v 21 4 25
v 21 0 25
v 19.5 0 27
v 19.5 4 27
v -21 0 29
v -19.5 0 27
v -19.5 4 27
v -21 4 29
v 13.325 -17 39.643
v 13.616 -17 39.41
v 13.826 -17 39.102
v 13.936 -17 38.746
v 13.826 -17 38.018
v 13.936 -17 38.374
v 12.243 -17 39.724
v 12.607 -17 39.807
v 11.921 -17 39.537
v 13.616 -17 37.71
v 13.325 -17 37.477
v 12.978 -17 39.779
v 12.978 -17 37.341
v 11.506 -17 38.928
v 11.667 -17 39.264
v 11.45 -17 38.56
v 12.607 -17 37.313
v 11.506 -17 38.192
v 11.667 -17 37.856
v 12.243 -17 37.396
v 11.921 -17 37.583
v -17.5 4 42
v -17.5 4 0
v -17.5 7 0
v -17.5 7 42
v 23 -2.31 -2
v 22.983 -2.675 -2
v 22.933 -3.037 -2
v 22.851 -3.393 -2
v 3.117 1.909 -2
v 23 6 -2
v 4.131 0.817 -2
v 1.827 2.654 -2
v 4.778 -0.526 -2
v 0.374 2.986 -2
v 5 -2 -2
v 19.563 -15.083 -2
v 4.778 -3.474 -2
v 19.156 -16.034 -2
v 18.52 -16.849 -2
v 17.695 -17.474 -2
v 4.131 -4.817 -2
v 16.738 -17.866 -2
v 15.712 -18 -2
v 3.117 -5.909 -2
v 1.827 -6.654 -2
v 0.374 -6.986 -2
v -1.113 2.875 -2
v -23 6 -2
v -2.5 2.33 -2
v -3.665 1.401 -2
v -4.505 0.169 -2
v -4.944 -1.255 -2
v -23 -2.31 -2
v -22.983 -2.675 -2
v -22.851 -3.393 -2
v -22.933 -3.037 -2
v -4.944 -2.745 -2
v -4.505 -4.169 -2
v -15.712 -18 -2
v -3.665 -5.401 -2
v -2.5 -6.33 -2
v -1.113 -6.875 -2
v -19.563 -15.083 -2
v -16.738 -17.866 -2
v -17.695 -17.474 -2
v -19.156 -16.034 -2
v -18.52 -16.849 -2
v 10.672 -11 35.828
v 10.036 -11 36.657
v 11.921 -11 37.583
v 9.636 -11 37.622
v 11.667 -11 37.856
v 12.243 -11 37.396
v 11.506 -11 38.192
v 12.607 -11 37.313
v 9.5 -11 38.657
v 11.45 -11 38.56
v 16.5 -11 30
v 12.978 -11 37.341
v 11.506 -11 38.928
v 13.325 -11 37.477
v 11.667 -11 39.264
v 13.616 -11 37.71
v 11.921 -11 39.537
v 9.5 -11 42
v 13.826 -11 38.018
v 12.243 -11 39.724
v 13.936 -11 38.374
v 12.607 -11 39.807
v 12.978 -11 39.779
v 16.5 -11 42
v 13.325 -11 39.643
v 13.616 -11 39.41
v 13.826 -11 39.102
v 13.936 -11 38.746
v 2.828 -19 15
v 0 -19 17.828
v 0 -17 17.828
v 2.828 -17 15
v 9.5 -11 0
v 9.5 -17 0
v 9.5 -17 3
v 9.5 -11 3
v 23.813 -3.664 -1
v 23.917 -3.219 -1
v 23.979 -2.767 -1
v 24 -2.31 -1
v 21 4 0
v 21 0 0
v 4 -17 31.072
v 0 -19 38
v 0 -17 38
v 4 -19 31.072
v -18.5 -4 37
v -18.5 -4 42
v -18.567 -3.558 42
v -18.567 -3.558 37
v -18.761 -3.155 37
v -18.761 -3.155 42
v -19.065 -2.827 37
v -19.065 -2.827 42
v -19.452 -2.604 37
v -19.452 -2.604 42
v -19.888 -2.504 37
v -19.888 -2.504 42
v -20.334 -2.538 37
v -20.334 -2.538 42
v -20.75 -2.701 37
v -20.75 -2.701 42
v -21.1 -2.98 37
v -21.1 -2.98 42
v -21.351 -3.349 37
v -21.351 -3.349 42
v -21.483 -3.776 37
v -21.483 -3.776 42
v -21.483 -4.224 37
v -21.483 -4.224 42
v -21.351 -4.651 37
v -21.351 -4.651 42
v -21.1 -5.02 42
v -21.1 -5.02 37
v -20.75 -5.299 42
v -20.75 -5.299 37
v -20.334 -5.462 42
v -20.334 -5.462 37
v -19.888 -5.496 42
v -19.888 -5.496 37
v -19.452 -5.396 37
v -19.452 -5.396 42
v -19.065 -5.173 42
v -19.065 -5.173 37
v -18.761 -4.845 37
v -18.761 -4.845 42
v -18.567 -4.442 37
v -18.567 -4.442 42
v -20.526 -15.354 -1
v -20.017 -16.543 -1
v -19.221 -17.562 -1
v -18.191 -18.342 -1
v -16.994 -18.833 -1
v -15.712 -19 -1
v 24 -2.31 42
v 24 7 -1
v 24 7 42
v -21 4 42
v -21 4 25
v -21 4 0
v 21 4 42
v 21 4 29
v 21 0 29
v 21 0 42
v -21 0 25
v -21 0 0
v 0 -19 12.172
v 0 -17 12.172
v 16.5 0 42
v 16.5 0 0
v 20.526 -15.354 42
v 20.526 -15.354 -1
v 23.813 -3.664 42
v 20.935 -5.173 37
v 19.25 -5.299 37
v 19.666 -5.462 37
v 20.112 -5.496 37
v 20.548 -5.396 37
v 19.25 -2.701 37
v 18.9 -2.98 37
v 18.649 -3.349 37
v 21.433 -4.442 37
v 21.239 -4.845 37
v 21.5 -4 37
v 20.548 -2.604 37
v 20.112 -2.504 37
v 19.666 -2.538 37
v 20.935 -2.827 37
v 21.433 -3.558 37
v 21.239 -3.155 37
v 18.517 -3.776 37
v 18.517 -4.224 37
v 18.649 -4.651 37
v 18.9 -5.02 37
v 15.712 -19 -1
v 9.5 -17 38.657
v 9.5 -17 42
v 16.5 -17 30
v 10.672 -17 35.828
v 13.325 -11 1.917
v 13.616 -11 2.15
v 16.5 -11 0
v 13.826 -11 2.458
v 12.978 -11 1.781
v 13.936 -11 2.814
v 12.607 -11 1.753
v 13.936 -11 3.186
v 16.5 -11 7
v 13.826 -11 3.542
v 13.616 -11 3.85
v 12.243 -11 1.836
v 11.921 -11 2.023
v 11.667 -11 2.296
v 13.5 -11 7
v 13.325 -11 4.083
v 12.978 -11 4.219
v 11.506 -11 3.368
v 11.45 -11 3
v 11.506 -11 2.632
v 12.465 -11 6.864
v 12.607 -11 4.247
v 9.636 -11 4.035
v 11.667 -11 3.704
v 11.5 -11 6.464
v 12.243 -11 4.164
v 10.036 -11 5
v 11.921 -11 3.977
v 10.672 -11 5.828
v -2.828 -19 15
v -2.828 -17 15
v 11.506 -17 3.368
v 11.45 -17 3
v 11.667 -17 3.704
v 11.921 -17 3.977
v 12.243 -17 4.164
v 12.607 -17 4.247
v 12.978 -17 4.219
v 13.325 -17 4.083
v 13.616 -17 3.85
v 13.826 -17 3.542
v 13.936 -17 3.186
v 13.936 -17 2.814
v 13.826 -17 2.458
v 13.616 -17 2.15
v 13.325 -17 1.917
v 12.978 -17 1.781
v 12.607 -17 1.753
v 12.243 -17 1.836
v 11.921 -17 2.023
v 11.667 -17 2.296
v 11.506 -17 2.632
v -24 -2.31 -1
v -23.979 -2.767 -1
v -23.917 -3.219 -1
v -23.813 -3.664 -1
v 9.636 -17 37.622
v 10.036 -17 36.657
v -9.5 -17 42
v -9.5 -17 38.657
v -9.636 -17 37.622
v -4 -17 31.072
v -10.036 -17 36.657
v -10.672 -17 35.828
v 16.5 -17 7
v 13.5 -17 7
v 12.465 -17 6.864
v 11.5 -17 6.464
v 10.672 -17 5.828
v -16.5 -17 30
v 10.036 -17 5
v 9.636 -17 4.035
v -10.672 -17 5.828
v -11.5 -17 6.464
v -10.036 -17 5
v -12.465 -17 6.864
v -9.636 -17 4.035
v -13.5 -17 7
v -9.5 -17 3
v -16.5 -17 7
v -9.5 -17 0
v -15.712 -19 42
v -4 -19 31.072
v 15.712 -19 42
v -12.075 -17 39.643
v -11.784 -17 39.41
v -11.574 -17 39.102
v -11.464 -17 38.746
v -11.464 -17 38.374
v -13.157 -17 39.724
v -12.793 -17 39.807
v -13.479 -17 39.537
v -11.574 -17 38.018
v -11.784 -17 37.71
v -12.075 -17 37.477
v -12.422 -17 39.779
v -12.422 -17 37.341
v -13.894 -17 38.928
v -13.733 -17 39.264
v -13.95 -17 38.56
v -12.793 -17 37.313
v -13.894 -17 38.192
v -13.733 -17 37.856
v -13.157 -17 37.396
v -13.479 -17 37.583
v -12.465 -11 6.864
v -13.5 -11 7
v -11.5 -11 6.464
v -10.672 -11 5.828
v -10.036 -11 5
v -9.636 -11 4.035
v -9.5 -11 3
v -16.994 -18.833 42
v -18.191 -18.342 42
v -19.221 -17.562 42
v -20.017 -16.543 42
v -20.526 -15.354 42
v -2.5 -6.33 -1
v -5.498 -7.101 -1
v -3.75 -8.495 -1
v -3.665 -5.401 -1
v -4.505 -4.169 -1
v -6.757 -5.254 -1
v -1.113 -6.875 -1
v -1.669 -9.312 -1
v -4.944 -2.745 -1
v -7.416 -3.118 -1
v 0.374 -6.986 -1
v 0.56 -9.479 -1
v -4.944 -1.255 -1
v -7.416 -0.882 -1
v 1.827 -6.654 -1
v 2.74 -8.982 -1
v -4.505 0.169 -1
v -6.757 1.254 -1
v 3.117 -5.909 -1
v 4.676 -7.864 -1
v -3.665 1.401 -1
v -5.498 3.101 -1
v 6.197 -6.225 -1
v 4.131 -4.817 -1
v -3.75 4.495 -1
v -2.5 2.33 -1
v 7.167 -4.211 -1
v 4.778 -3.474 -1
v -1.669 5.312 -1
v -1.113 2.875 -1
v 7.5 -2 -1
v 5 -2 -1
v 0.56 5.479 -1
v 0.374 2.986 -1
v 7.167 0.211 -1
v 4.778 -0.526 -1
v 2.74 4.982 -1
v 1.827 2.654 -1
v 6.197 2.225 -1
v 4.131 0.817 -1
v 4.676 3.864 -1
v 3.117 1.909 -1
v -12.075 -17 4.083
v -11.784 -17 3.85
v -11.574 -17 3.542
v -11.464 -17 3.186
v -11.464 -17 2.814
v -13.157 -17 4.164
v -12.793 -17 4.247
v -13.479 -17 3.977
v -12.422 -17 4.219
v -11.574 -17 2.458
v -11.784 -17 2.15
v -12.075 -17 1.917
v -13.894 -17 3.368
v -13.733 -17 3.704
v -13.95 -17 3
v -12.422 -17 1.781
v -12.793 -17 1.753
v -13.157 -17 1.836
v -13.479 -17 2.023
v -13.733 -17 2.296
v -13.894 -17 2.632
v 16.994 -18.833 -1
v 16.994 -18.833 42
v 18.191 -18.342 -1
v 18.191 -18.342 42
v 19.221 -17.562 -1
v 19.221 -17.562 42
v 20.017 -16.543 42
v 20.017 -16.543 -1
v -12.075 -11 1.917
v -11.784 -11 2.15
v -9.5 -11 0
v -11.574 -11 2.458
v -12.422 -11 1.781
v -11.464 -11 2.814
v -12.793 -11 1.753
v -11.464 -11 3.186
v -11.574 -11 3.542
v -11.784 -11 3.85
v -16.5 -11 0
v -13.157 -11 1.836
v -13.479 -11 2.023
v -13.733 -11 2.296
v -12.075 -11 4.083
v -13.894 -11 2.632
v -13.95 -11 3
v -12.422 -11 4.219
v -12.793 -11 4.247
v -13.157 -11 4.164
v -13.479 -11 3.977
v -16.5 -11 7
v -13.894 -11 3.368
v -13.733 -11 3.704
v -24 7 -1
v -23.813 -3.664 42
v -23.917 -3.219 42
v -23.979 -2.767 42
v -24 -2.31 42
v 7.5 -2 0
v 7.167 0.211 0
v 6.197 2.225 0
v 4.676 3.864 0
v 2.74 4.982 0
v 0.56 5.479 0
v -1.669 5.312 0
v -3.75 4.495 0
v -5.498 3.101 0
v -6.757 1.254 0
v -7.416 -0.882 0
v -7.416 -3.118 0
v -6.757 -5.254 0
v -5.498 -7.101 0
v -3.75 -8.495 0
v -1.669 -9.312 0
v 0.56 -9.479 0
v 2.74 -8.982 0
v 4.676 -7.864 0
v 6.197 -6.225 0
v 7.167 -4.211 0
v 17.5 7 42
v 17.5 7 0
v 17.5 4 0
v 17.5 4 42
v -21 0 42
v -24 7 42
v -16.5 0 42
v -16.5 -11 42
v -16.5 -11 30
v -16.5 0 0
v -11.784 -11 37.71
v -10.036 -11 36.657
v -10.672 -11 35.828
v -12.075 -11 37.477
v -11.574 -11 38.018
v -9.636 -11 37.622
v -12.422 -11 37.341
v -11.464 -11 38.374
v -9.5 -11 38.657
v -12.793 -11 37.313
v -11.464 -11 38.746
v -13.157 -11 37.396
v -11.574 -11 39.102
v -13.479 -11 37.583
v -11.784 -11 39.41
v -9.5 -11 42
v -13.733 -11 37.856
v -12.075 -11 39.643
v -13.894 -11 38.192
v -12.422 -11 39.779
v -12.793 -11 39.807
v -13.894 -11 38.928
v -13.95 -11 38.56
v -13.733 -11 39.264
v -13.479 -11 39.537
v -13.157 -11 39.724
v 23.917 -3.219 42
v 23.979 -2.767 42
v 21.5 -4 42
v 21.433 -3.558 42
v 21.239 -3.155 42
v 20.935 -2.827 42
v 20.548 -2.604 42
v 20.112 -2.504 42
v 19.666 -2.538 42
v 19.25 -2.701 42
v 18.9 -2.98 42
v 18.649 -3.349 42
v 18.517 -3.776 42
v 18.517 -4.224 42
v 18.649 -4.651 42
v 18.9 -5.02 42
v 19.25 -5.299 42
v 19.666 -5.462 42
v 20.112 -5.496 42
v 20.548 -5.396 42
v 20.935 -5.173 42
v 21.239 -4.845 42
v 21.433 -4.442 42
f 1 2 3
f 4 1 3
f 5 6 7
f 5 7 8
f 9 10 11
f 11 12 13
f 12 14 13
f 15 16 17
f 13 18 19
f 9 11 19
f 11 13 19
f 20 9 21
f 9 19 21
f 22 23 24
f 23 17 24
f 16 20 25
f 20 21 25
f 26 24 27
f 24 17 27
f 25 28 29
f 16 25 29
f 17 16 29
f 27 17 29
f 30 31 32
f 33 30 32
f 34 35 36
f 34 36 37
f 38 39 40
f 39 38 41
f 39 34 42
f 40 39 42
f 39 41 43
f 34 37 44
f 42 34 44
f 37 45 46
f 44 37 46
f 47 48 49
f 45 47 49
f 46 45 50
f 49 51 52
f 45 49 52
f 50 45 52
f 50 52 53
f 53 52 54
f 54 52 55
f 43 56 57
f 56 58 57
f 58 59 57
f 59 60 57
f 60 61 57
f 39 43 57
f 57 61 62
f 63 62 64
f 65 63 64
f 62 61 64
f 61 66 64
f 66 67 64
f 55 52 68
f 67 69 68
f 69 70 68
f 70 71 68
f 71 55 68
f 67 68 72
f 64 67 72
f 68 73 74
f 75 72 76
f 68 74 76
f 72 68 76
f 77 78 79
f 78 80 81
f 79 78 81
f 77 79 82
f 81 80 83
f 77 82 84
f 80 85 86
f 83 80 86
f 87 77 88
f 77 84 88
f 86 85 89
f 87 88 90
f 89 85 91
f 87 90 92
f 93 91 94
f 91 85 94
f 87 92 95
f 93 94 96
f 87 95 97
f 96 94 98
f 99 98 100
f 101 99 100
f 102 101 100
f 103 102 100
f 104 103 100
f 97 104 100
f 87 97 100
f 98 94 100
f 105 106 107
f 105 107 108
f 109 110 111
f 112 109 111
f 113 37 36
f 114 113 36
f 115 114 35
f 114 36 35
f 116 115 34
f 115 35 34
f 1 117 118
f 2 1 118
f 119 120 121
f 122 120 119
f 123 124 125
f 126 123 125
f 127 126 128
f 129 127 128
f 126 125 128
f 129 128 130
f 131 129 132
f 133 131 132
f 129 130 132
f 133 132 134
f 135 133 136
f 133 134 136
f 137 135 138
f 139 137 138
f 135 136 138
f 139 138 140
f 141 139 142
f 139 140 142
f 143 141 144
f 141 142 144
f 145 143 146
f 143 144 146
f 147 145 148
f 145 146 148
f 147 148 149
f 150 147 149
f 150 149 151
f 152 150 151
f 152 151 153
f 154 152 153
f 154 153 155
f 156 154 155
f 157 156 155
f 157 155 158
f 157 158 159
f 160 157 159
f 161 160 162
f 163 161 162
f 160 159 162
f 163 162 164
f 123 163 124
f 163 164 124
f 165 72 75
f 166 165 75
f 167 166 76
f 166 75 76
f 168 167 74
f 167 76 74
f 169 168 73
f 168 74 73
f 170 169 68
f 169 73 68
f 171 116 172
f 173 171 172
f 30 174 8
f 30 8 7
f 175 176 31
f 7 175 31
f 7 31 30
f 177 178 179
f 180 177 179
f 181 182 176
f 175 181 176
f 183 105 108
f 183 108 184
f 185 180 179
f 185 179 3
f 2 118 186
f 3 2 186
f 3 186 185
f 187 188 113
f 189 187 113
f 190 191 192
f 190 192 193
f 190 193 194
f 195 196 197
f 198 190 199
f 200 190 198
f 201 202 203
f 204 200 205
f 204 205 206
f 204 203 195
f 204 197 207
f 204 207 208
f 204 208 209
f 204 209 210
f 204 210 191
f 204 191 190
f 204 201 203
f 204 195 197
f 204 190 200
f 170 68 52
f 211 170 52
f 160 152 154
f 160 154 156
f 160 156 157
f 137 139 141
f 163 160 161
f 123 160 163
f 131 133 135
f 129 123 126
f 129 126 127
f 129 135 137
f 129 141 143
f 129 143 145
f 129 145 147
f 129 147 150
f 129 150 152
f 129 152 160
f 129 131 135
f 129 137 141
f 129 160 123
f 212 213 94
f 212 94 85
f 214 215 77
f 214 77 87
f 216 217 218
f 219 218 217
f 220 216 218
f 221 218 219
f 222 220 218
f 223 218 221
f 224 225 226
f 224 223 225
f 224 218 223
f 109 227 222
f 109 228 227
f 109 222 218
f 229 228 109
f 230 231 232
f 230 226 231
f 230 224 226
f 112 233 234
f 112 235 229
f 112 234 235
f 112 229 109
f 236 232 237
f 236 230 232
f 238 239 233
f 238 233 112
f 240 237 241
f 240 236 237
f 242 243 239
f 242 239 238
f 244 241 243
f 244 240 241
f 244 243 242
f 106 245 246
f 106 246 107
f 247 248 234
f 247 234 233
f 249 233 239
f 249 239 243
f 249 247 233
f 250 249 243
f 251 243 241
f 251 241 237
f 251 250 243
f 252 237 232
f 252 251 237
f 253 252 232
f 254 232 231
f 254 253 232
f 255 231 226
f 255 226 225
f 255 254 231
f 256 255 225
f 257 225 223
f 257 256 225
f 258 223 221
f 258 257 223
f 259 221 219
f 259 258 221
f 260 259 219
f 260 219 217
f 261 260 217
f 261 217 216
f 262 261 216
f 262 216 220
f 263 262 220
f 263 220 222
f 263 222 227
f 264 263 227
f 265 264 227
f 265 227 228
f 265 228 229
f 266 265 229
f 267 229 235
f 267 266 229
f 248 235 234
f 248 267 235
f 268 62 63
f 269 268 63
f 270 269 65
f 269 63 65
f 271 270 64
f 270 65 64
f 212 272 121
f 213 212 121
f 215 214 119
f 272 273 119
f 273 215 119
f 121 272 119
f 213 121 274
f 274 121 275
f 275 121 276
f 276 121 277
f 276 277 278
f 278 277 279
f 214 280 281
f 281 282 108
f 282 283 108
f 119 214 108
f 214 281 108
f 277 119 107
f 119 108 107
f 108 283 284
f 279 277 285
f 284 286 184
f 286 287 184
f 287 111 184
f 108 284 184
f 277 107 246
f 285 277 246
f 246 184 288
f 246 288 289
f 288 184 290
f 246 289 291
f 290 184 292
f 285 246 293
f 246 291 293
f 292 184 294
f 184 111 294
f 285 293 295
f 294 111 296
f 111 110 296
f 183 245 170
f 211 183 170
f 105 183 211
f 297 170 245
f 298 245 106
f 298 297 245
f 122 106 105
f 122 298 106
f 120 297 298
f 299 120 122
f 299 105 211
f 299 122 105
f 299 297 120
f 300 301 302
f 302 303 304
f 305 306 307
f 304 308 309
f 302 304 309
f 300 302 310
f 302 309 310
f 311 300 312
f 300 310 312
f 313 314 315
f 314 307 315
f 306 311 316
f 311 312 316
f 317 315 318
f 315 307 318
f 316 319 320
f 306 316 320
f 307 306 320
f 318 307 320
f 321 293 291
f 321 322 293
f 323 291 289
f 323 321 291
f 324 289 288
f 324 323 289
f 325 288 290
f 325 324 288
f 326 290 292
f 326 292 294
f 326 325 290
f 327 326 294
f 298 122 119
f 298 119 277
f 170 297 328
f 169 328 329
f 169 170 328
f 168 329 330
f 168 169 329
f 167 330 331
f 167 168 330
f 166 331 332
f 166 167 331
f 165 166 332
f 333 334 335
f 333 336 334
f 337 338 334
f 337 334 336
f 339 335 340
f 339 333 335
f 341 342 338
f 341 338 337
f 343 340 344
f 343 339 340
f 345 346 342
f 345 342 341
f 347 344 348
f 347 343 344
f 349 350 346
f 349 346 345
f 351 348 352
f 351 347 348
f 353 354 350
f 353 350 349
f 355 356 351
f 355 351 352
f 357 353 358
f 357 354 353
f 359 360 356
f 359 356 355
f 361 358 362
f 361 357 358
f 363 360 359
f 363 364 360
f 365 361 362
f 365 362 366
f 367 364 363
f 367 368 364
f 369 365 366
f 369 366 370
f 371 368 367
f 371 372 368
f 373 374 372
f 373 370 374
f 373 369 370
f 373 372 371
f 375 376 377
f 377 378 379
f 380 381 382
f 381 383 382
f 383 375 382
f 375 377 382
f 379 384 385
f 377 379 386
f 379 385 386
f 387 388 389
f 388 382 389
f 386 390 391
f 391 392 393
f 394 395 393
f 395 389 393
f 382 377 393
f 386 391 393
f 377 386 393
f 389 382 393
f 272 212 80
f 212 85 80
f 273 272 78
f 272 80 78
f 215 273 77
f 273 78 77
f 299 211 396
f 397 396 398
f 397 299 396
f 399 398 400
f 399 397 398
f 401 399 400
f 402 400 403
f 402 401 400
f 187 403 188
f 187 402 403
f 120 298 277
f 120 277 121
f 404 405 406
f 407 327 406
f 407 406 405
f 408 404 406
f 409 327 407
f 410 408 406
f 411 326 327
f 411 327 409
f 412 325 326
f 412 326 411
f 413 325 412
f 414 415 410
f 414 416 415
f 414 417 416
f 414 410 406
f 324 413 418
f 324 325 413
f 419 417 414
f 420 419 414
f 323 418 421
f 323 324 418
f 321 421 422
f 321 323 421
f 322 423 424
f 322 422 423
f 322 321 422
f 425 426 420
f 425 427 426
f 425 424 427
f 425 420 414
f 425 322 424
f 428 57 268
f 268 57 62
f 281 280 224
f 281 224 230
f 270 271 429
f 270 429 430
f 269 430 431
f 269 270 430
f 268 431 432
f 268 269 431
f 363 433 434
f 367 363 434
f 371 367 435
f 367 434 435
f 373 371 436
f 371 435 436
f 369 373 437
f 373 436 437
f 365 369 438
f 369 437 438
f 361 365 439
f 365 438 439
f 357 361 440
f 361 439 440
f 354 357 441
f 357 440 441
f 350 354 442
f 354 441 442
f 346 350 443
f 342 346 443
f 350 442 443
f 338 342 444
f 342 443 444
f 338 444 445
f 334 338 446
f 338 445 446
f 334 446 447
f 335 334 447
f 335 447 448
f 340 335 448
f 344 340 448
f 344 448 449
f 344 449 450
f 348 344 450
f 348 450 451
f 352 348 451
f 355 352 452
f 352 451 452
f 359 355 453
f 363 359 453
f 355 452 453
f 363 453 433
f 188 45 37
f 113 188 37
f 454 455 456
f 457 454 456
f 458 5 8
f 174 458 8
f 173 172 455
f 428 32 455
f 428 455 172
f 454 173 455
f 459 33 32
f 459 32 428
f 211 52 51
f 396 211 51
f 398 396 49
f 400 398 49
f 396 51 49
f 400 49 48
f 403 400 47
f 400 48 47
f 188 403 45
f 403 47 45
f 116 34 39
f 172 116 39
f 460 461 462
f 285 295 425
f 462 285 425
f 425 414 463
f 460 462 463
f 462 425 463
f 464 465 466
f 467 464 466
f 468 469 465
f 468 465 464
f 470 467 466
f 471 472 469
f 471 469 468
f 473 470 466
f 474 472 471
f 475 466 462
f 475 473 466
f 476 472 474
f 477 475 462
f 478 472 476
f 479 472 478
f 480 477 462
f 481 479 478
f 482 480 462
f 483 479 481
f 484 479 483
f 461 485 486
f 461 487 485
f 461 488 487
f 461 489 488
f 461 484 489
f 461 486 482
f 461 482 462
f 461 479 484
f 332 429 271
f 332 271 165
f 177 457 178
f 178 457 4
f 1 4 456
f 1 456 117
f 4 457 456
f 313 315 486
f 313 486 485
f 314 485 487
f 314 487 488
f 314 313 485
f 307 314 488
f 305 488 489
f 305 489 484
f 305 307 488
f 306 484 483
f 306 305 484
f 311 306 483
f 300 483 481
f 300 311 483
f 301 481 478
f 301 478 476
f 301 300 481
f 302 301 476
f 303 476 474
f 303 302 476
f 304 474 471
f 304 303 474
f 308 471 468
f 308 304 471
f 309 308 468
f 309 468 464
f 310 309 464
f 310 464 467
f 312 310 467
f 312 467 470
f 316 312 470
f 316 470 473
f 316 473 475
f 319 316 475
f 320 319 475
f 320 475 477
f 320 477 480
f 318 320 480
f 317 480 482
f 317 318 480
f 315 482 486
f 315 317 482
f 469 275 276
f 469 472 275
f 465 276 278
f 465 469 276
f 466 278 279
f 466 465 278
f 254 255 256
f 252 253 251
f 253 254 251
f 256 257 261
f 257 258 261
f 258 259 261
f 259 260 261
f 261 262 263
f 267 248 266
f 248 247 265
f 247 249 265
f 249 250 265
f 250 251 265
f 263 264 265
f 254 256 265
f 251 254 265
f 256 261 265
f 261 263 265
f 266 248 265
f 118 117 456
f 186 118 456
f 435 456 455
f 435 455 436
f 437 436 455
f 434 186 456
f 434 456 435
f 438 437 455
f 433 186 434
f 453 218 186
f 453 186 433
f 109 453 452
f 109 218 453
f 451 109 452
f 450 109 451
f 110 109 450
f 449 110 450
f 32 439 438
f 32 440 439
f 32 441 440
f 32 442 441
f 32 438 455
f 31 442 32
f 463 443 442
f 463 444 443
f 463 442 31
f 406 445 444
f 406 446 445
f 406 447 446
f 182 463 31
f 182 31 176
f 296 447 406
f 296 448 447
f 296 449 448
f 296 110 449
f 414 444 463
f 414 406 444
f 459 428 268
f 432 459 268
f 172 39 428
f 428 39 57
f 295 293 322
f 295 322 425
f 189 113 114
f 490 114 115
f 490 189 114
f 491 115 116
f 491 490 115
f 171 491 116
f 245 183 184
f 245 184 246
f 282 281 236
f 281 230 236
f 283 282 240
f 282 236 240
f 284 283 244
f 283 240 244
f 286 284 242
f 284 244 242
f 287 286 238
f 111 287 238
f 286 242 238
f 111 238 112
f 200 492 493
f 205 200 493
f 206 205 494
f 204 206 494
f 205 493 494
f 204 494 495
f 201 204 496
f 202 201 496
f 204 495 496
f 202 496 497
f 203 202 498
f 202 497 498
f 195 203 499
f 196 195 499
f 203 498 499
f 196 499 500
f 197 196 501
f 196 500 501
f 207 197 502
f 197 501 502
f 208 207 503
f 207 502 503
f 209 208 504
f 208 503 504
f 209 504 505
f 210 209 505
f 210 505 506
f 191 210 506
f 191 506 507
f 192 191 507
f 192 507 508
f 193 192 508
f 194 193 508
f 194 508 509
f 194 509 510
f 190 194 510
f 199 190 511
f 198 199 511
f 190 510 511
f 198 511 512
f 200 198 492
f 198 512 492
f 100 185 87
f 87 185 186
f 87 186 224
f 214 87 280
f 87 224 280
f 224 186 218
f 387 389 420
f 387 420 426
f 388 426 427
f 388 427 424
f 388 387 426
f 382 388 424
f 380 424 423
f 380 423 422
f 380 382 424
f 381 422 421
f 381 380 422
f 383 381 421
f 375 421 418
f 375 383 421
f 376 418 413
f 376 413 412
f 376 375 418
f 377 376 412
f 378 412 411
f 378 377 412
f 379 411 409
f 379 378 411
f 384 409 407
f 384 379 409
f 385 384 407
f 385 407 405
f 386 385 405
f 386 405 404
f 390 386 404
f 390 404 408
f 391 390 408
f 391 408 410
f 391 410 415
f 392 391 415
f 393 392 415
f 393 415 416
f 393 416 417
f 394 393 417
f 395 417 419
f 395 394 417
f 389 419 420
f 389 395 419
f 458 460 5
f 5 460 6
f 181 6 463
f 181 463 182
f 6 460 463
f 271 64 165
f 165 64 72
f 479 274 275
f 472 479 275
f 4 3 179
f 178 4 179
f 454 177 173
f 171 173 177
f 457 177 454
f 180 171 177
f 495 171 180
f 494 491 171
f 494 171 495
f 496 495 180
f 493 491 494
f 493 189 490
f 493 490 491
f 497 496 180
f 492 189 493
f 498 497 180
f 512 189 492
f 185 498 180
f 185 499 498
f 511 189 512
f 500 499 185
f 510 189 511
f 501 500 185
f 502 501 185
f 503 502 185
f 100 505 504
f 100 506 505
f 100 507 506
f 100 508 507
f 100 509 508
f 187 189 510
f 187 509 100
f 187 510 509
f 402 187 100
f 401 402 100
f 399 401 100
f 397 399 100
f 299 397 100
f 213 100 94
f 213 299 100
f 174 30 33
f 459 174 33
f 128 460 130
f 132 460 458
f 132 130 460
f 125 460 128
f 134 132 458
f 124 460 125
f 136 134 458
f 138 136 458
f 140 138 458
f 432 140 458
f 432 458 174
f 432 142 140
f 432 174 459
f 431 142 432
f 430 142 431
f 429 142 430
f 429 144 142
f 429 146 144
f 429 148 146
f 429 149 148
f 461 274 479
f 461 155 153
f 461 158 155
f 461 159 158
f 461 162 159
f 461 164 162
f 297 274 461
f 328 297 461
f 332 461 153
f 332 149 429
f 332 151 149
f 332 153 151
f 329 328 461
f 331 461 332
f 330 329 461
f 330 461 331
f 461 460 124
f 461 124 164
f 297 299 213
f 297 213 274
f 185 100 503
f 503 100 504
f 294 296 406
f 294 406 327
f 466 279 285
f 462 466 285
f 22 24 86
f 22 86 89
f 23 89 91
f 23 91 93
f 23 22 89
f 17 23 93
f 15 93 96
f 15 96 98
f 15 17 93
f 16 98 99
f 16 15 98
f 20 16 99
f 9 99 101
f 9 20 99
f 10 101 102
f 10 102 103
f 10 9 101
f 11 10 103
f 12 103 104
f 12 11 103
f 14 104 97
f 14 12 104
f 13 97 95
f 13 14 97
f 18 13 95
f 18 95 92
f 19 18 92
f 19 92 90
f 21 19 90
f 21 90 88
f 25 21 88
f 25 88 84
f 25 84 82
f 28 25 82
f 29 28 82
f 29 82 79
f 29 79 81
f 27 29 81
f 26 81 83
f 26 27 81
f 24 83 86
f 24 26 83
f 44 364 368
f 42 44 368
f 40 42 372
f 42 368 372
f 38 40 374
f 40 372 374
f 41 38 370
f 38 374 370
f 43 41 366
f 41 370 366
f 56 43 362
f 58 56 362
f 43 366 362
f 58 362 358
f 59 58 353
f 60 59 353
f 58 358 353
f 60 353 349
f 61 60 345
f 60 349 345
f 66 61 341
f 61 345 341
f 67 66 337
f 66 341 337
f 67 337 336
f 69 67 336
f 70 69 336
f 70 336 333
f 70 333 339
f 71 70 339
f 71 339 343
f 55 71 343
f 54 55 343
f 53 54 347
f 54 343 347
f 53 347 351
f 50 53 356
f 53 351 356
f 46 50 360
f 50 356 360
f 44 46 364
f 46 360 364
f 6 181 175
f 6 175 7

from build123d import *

# Parameters (mm, degrees)
PAD_DEPTH       = 42
PAD001_DEPTH    = 2
POCKET_DEPTH    = 2
PAD002_DEPTH    = 4
FILLET_R        = 5
SKETCH004_R     = 1.25
SKETCH004_W     = 7
SKETCH004_H     = 7
PAD003_DEPTH    = 6
FILLET001_R     = 4
SKETCH005_R     = 7.5
POCKET001_DEPTH = 1
SKETCH006_R     = 5
POCKET002_DEPTH = 1
SKETCH008_R     = 1.5
POCKET004_DEPTH = 5
CHAMFER_SIZE    = 1


with BuildPart() as part:
    # Sketch → Pad (new body)
    with BuildSketch(Plane.XY):
        Polygon((-17.5, 4), (-17.5, 7), (-24, 7), (-24, -3), (-19.5, -19), (19.5, -19), (24, -3), (24, 7), (17.5, 7), (17.5, 4), (21, 4), (21, 0), (16.5, 0), (16.5, -17), (-16.5, -17), (-16.5, 0), (-21, 0), (-21, 4), align=None)
    extrude(amount=PAD_DEPTH)

    # Sketch001 (on Face19 of Pad) → Pad001 (join)
    with BuildSketch(Plane(origin=(0, 0, 0), x_dir=(1, 0, 0), z_dir=(0, 0, -1))):
        Polygon((-19.5, 19), (19.5, 19), (24, 3), (24, -7), (-24, -7), (-24, 3), align=None)
    extrude(amount=PAD001_DEPTH)

    # Sketch002 (on Face18 of Pad001) → Pocket (cut)
    with BuildSketch(Plane.XZ.offset(19)):
        Polygon((-4, 31.071797), (0, 38), (4, 31.071797), align=None)
        Polygon((-2.828427, 15), (0, 17.828427), (2.828427, 15), (0, 12.171573), align=None)
    extrude(amount=-POCKET_DEPTH, mode=Mode.SUBTRACT)

    # Sketch003 (on Face12 of Pocket) → Pad002 (join)
    with BuildSketch(Plane(origin=(0, 0, 0), x_dir=(-1, 0, 0), z_dir=(0, 1, 0))):
        Polygon((-21, 29), (-21, 25), (-19.5, 27), align=None)
        Polygon((21, 29), (21, 25), (19.5, 27), align=None)
    extrude(amount=PAD002_DEPTH)

    # Fillet
    fillet_edges = [part.edges().sort_by_distance(p)[0] for p in [
        (-24, -3, 21),
        (-19.5, -19, 21),
        (19.5, -19, 21),
        (24, -3, 21),
    ]]
    fillet(fillet_edges, radius=FILLET_R)

    # Sketch004 (on Face16 of Fillet) → Pad003 (join)
    with BuildSketch(Plane(origin=(0, -17, 0), x_dir=(-1, 0, 0), z_dir=(0, 1, 0))):
        Polygon((-16.5, 42), (-9.5, 42), (-9.5, 37), (-16.5, 30), align=None)
        with Locations((-12.7, 38.56)):
            Circle(SKETCH004_R, mode=Mode.SUBTRACT)
        Polygon((16.5, 42), (9.5, 42), (9.5, 37), (16.5, 30), align=None)
        with Locations((12.7, 38.56)):
            Circle(SKETCH004_R, mode=Mode.SUBTRACT)
        with Locations((-13, 3.5)):
            Rectangle(SKETCH004_W, SKETCH004_H)
        with Locations((-12.7, 3)):
            Circle(SKETCH004_R, mode=Mode.SUBTRACT)
        with Locations((13, 3.5)):
            Rectangle(SKETCH004_W, SKETCH004_H)
        with Locations((12.7, 3)):
            Circle(SKETCH004_R, mode=Mode.SUBTRACT)
    extrude(amount=PAD003_DEPTH)

    # Fillet001
    fillet001_edges = [part.edges().sort_by_distance(p)[0] for p in [
        (9.5, -14, 37),
        (9.5, -14, 7),
        (-9.5, -14, 7),
        (-9.5, -14, 37),
    ]]
    fillet(fillet001_edges, radius=FILLET001_R)

    # Sketch005 (on Face7 of Fillet001) → Pocket001 (cut)
    with BuildSketch(Plane.XY):
        with Locations((0, -2)):
            Circle(SKETCH005_R)
    extrude(amount=-POCKET001_DEPTH, mode=Mode.SUBTRACT)

    # Sketch006 (on Face62 of Pocket001) → Pocket002 (cut)
    with BuildSketch(Plane.XY.offset(-1)):
        with Locations((0, -2)):
            Circle(SKETCH006_R)
    extrude(amount=-POCKET002_DEPTH, mode=Mode.SUBTRACT)

    # Sketch008 (on Face12 of Pocket002) → Pocket004 (cut)
    with BuildSketch(Plane.XY.offset(42)):
        with Locations((-20, -4)):
            Circle(SKETCH008_R)
        with Locations((20, -4)):
            Circle(SKETCH008_R)
    extrude(amount=-POCKET004_DEPTH, mode=Mode.SUBTRACT)

    # Chamfer
    chamfer_edges = [part.edges().sort_by_distance(p)[0] for p in [
        (0, -19, -2),
        (0, 7, -2),
    ]]
    chamfer(chamfer_edges, length=CHAMFER_SIZE)


solid = part.part
